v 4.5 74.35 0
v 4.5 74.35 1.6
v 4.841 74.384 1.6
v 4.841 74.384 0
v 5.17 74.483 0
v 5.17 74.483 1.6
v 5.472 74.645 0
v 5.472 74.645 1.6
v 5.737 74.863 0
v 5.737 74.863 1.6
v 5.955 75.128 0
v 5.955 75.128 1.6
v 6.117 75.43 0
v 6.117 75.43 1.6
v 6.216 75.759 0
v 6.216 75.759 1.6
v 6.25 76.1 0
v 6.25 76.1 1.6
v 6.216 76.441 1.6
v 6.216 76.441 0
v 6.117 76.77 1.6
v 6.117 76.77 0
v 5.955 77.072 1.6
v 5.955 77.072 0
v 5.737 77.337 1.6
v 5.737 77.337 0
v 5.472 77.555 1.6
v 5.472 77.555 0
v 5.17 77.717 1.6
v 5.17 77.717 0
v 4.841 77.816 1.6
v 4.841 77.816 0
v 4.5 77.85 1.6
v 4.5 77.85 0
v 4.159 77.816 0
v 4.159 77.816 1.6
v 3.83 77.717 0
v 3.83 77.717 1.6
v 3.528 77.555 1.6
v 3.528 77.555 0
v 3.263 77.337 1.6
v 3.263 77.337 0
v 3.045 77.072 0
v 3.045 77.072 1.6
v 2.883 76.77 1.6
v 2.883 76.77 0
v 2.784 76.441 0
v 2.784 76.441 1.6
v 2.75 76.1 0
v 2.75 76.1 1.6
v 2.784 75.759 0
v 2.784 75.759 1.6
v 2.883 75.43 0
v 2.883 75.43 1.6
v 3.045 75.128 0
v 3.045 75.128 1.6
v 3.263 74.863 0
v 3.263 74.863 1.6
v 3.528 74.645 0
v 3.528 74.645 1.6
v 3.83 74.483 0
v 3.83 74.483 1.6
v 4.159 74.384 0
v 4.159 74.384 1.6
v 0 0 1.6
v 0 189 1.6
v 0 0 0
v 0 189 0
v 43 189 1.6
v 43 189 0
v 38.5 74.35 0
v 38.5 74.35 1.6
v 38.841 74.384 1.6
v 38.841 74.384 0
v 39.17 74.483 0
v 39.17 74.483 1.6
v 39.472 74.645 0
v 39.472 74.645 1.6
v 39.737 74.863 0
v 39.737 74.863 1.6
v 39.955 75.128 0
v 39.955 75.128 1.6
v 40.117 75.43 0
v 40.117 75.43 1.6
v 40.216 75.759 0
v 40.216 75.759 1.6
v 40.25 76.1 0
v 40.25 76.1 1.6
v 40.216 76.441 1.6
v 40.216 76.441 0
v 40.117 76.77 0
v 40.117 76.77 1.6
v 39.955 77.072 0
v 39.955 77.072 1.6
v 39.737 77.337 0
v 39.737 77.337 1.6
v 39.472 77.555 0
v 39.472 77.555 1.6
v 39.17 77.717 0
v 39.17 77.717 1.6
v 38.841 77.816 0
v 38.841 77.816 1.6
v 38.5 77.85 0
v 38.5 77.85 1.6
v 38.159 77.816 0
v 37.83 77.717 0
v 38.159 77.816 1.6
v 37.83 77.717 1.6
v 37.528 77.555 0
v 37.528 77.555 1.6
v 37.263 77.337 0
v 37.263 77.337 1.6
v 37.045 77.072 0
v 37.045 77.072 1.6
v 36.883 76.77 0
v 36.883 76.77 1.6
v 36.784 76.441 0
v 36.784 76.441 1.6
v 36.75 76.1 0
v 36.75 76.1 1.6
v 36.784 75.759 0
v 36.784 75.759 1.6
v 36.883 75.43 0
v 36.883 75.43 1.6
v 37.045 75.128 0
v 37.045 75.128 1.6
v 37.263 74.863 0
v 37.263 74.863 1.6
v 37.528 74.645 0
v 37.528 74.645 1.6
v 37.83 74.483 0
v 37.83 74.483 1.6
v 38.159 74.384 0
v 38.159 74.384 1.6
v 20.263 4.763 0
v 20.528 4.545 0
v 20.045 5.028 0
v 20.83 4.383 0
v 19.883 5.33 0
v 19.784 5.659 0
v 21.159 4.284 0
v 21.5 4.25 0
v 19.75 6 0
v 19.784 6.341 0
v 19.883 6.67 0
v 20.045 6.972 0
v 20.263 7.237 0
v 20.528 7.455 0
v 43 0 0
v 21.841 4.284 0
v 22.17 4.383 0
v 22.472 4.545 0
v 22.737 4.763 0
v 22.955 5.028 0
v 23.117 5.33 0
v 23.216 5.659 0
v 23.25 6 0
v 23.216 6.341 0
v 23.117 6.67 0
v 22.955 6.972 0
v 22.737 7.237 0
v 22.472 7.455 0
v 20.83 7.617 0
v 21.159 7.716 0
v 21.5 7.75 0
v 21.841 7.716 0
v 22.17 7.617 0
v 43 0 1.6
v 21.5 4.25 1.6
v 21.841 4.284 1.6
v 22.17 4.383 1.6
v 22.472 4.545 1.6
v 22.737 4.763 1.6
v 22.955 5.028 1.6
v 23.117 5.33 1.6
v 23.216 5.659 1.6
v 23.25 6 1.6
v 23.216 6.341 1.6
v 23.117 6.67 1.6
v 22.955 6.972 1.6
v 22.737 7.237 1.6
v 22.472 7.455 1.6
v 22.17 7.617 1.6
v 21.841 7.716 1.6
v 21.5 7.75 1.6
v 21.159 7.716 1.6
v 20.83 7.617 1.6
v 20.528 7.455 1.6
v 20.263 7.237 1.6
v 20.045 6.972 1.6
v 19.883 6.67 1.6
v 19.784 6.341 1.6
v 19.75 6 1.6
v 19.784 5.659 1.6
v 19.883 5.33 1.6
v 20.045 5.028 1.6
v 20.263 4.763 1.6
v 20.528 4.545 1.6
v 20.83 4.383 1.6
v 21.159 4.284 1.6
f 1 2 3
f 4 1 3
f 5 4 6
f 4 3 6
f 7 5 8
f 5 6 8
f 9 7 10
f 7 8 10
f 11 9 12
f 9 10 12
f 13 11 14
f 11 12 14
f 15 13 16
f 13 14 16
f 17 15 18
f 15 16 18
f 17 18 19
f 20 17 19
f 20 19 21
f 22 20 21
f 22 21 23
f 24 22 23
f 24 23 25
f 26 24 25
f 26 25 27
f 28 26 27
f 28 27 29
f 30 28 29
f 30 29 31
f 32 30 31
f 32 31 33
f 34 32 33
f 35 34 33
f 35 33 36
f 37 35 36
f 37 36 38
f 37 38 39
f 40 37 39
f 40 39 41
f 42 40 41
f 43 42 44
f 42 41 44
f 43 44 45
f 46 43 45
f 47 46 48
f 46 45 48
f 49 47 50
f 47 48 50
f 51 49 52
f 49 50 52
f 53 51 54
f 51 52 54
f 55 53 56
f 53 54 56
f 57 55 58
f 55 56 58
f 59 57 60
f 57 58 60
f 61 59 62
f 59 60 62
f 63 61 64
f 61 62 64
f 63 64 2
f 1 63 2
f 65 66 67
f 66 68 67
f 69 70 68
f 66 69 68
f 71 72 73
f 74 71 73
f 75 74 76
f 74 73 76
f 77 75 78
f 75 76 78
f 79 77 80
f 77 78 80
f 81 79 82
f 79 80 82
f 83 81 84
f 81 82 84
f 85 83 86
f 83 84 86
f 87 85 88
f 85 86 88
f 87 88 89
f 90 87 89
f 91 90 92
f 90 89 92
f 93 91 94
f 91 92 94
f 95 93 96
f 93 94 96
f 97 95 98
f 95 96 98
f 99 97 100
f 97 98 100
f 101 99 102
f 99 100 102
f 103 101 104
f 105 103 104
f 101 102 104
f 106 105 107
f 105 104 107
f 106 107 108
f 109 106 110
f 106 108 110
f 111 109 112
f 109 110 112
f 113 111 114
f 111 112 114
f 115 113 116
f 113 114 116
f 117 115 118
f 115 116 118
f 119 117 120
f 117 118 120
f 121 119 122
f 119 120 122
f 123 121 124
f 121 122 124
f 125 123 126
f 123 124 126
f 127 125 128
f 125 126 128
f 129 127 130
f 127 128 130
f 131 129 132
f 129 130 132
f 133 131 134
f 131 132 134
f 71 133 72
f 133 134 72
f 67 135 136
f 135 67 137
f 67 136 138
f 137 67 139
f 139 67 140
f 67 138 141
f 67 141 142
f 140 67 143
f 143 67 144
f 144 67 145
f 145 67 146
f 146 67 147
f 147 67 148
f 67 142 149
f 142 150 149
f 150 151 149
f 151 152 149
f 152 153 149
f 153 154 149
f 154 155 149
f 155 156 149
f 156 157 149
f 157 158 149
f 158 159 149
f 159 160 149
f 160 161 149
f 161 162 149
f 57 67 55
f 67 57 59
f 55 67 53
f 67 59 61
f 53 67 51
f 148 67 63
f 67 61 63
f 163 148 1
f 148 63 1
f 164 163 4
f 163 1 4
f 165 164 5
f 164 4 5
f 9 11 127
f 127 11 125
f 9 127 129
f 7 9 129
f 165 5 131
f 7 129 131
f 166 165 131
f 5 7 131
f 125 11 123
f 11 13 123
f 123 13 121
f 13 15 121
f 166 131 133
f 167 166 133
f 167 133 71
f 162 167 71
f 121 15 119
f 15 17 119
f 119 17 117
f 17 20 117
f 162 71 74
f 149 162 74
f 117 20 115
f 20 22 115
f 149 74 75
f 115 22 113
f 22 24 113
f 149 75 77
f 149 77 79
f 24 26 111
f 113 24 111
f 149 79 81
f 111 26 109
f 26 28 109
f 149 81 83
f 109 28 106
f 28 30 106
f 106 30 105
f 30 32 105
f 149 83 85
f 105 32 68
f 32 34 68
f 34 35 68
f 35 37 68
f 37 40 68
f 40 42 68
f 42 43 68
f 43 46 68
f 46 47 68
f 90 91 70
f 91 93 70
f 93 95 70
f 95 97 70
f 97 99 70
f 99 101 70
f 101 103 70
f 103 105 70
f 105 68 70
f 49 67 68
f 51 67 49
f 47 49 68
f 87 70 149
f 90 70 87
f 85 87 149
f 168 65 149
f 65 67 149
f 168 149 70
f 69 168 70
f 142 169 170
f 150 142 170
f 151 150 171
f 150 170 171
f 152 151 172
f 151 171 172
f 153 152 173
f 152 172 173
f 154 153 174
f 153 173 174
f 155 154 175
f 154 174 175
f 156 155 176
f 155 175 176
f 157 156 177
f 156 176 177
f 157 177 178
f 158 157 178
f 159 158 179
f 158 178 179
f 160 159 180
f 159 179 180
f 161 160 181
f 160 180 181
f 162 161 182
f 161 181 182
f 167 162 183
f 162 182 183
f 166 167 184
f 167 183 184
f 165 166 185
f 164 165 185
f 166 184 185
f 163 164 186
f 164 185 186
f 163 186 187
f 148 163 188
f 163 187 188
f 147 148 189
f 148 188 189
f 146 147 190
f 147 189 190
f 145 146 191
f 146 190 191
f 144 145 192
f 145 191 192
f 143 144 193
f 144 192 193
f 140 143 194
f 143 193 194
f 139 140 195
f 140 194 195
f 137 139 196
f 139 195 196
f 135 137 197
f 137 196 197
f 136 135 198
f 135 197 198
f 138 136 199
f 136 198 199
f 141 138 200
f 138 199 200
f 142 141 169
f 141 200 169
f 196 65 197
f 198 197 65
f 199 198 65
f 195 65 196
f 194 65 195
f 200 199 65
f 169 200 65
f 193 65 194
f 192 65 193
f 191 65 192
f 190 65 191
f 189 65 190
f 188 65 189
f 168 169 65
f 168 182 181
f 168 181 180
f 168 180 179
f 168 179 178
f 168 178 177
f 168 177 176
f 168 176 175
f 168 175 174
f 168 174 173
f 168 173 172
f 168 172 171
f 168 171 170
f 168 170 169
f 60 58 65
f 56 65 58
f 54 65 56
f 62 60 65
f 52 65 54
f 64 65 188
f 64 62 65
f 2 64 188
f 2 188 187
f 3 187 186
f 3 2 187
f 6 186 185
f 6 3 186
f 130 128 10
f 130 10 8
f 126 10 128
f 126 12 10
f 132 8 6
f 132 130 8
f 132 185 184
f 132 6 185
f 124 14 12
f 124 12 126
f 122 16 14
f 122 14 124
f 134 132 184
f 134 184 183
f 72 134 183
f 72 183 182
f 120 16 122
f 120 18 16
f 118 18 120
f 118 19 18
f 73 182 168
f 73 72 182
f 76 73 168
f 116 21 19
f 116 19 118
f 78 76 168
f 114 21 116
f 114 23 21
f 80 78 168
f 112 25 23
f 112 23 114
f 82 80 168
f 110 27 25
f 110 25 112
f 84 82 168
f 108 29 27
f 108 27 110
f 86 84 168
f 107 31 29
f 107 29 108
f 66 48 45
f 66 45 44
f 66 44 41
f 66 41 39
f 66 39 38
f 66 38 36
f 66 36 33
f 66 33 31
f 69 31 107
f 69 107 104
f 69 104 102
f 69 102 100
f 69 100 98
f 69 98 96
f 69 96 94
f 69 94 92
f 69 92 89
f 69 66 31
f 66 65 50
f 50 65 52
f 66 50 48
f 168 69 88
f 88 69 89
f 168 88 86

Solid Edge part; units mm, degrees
sketch "Sketch1" plane through (0, 0, 0) normal (0, 0, 1) x (1, 0, 0)
  line L0 (43, 0) -> (43, 189)
  line L1 (43, 189) -> (0, 189)
  line L2 (0, 189) -> (0, 0)
  line L3 (0, 0) -> (43, 0)
extrude "Protrusion1" add sketch "Sketch1" along normal blind 1.6
hole "Hole_1" at (4.5, 76.1, 1.6) direction (0, 0, -1) diameter 3.5 end through all
hole "Hole1" at (38.5, 76.1, 1.6) direction (0, 0, -1) diameter 3.5 end through all
hole "Hole2" at (21.5, 6, 1.6) direction (0, 0, -1) diameter 3.5 end through all
